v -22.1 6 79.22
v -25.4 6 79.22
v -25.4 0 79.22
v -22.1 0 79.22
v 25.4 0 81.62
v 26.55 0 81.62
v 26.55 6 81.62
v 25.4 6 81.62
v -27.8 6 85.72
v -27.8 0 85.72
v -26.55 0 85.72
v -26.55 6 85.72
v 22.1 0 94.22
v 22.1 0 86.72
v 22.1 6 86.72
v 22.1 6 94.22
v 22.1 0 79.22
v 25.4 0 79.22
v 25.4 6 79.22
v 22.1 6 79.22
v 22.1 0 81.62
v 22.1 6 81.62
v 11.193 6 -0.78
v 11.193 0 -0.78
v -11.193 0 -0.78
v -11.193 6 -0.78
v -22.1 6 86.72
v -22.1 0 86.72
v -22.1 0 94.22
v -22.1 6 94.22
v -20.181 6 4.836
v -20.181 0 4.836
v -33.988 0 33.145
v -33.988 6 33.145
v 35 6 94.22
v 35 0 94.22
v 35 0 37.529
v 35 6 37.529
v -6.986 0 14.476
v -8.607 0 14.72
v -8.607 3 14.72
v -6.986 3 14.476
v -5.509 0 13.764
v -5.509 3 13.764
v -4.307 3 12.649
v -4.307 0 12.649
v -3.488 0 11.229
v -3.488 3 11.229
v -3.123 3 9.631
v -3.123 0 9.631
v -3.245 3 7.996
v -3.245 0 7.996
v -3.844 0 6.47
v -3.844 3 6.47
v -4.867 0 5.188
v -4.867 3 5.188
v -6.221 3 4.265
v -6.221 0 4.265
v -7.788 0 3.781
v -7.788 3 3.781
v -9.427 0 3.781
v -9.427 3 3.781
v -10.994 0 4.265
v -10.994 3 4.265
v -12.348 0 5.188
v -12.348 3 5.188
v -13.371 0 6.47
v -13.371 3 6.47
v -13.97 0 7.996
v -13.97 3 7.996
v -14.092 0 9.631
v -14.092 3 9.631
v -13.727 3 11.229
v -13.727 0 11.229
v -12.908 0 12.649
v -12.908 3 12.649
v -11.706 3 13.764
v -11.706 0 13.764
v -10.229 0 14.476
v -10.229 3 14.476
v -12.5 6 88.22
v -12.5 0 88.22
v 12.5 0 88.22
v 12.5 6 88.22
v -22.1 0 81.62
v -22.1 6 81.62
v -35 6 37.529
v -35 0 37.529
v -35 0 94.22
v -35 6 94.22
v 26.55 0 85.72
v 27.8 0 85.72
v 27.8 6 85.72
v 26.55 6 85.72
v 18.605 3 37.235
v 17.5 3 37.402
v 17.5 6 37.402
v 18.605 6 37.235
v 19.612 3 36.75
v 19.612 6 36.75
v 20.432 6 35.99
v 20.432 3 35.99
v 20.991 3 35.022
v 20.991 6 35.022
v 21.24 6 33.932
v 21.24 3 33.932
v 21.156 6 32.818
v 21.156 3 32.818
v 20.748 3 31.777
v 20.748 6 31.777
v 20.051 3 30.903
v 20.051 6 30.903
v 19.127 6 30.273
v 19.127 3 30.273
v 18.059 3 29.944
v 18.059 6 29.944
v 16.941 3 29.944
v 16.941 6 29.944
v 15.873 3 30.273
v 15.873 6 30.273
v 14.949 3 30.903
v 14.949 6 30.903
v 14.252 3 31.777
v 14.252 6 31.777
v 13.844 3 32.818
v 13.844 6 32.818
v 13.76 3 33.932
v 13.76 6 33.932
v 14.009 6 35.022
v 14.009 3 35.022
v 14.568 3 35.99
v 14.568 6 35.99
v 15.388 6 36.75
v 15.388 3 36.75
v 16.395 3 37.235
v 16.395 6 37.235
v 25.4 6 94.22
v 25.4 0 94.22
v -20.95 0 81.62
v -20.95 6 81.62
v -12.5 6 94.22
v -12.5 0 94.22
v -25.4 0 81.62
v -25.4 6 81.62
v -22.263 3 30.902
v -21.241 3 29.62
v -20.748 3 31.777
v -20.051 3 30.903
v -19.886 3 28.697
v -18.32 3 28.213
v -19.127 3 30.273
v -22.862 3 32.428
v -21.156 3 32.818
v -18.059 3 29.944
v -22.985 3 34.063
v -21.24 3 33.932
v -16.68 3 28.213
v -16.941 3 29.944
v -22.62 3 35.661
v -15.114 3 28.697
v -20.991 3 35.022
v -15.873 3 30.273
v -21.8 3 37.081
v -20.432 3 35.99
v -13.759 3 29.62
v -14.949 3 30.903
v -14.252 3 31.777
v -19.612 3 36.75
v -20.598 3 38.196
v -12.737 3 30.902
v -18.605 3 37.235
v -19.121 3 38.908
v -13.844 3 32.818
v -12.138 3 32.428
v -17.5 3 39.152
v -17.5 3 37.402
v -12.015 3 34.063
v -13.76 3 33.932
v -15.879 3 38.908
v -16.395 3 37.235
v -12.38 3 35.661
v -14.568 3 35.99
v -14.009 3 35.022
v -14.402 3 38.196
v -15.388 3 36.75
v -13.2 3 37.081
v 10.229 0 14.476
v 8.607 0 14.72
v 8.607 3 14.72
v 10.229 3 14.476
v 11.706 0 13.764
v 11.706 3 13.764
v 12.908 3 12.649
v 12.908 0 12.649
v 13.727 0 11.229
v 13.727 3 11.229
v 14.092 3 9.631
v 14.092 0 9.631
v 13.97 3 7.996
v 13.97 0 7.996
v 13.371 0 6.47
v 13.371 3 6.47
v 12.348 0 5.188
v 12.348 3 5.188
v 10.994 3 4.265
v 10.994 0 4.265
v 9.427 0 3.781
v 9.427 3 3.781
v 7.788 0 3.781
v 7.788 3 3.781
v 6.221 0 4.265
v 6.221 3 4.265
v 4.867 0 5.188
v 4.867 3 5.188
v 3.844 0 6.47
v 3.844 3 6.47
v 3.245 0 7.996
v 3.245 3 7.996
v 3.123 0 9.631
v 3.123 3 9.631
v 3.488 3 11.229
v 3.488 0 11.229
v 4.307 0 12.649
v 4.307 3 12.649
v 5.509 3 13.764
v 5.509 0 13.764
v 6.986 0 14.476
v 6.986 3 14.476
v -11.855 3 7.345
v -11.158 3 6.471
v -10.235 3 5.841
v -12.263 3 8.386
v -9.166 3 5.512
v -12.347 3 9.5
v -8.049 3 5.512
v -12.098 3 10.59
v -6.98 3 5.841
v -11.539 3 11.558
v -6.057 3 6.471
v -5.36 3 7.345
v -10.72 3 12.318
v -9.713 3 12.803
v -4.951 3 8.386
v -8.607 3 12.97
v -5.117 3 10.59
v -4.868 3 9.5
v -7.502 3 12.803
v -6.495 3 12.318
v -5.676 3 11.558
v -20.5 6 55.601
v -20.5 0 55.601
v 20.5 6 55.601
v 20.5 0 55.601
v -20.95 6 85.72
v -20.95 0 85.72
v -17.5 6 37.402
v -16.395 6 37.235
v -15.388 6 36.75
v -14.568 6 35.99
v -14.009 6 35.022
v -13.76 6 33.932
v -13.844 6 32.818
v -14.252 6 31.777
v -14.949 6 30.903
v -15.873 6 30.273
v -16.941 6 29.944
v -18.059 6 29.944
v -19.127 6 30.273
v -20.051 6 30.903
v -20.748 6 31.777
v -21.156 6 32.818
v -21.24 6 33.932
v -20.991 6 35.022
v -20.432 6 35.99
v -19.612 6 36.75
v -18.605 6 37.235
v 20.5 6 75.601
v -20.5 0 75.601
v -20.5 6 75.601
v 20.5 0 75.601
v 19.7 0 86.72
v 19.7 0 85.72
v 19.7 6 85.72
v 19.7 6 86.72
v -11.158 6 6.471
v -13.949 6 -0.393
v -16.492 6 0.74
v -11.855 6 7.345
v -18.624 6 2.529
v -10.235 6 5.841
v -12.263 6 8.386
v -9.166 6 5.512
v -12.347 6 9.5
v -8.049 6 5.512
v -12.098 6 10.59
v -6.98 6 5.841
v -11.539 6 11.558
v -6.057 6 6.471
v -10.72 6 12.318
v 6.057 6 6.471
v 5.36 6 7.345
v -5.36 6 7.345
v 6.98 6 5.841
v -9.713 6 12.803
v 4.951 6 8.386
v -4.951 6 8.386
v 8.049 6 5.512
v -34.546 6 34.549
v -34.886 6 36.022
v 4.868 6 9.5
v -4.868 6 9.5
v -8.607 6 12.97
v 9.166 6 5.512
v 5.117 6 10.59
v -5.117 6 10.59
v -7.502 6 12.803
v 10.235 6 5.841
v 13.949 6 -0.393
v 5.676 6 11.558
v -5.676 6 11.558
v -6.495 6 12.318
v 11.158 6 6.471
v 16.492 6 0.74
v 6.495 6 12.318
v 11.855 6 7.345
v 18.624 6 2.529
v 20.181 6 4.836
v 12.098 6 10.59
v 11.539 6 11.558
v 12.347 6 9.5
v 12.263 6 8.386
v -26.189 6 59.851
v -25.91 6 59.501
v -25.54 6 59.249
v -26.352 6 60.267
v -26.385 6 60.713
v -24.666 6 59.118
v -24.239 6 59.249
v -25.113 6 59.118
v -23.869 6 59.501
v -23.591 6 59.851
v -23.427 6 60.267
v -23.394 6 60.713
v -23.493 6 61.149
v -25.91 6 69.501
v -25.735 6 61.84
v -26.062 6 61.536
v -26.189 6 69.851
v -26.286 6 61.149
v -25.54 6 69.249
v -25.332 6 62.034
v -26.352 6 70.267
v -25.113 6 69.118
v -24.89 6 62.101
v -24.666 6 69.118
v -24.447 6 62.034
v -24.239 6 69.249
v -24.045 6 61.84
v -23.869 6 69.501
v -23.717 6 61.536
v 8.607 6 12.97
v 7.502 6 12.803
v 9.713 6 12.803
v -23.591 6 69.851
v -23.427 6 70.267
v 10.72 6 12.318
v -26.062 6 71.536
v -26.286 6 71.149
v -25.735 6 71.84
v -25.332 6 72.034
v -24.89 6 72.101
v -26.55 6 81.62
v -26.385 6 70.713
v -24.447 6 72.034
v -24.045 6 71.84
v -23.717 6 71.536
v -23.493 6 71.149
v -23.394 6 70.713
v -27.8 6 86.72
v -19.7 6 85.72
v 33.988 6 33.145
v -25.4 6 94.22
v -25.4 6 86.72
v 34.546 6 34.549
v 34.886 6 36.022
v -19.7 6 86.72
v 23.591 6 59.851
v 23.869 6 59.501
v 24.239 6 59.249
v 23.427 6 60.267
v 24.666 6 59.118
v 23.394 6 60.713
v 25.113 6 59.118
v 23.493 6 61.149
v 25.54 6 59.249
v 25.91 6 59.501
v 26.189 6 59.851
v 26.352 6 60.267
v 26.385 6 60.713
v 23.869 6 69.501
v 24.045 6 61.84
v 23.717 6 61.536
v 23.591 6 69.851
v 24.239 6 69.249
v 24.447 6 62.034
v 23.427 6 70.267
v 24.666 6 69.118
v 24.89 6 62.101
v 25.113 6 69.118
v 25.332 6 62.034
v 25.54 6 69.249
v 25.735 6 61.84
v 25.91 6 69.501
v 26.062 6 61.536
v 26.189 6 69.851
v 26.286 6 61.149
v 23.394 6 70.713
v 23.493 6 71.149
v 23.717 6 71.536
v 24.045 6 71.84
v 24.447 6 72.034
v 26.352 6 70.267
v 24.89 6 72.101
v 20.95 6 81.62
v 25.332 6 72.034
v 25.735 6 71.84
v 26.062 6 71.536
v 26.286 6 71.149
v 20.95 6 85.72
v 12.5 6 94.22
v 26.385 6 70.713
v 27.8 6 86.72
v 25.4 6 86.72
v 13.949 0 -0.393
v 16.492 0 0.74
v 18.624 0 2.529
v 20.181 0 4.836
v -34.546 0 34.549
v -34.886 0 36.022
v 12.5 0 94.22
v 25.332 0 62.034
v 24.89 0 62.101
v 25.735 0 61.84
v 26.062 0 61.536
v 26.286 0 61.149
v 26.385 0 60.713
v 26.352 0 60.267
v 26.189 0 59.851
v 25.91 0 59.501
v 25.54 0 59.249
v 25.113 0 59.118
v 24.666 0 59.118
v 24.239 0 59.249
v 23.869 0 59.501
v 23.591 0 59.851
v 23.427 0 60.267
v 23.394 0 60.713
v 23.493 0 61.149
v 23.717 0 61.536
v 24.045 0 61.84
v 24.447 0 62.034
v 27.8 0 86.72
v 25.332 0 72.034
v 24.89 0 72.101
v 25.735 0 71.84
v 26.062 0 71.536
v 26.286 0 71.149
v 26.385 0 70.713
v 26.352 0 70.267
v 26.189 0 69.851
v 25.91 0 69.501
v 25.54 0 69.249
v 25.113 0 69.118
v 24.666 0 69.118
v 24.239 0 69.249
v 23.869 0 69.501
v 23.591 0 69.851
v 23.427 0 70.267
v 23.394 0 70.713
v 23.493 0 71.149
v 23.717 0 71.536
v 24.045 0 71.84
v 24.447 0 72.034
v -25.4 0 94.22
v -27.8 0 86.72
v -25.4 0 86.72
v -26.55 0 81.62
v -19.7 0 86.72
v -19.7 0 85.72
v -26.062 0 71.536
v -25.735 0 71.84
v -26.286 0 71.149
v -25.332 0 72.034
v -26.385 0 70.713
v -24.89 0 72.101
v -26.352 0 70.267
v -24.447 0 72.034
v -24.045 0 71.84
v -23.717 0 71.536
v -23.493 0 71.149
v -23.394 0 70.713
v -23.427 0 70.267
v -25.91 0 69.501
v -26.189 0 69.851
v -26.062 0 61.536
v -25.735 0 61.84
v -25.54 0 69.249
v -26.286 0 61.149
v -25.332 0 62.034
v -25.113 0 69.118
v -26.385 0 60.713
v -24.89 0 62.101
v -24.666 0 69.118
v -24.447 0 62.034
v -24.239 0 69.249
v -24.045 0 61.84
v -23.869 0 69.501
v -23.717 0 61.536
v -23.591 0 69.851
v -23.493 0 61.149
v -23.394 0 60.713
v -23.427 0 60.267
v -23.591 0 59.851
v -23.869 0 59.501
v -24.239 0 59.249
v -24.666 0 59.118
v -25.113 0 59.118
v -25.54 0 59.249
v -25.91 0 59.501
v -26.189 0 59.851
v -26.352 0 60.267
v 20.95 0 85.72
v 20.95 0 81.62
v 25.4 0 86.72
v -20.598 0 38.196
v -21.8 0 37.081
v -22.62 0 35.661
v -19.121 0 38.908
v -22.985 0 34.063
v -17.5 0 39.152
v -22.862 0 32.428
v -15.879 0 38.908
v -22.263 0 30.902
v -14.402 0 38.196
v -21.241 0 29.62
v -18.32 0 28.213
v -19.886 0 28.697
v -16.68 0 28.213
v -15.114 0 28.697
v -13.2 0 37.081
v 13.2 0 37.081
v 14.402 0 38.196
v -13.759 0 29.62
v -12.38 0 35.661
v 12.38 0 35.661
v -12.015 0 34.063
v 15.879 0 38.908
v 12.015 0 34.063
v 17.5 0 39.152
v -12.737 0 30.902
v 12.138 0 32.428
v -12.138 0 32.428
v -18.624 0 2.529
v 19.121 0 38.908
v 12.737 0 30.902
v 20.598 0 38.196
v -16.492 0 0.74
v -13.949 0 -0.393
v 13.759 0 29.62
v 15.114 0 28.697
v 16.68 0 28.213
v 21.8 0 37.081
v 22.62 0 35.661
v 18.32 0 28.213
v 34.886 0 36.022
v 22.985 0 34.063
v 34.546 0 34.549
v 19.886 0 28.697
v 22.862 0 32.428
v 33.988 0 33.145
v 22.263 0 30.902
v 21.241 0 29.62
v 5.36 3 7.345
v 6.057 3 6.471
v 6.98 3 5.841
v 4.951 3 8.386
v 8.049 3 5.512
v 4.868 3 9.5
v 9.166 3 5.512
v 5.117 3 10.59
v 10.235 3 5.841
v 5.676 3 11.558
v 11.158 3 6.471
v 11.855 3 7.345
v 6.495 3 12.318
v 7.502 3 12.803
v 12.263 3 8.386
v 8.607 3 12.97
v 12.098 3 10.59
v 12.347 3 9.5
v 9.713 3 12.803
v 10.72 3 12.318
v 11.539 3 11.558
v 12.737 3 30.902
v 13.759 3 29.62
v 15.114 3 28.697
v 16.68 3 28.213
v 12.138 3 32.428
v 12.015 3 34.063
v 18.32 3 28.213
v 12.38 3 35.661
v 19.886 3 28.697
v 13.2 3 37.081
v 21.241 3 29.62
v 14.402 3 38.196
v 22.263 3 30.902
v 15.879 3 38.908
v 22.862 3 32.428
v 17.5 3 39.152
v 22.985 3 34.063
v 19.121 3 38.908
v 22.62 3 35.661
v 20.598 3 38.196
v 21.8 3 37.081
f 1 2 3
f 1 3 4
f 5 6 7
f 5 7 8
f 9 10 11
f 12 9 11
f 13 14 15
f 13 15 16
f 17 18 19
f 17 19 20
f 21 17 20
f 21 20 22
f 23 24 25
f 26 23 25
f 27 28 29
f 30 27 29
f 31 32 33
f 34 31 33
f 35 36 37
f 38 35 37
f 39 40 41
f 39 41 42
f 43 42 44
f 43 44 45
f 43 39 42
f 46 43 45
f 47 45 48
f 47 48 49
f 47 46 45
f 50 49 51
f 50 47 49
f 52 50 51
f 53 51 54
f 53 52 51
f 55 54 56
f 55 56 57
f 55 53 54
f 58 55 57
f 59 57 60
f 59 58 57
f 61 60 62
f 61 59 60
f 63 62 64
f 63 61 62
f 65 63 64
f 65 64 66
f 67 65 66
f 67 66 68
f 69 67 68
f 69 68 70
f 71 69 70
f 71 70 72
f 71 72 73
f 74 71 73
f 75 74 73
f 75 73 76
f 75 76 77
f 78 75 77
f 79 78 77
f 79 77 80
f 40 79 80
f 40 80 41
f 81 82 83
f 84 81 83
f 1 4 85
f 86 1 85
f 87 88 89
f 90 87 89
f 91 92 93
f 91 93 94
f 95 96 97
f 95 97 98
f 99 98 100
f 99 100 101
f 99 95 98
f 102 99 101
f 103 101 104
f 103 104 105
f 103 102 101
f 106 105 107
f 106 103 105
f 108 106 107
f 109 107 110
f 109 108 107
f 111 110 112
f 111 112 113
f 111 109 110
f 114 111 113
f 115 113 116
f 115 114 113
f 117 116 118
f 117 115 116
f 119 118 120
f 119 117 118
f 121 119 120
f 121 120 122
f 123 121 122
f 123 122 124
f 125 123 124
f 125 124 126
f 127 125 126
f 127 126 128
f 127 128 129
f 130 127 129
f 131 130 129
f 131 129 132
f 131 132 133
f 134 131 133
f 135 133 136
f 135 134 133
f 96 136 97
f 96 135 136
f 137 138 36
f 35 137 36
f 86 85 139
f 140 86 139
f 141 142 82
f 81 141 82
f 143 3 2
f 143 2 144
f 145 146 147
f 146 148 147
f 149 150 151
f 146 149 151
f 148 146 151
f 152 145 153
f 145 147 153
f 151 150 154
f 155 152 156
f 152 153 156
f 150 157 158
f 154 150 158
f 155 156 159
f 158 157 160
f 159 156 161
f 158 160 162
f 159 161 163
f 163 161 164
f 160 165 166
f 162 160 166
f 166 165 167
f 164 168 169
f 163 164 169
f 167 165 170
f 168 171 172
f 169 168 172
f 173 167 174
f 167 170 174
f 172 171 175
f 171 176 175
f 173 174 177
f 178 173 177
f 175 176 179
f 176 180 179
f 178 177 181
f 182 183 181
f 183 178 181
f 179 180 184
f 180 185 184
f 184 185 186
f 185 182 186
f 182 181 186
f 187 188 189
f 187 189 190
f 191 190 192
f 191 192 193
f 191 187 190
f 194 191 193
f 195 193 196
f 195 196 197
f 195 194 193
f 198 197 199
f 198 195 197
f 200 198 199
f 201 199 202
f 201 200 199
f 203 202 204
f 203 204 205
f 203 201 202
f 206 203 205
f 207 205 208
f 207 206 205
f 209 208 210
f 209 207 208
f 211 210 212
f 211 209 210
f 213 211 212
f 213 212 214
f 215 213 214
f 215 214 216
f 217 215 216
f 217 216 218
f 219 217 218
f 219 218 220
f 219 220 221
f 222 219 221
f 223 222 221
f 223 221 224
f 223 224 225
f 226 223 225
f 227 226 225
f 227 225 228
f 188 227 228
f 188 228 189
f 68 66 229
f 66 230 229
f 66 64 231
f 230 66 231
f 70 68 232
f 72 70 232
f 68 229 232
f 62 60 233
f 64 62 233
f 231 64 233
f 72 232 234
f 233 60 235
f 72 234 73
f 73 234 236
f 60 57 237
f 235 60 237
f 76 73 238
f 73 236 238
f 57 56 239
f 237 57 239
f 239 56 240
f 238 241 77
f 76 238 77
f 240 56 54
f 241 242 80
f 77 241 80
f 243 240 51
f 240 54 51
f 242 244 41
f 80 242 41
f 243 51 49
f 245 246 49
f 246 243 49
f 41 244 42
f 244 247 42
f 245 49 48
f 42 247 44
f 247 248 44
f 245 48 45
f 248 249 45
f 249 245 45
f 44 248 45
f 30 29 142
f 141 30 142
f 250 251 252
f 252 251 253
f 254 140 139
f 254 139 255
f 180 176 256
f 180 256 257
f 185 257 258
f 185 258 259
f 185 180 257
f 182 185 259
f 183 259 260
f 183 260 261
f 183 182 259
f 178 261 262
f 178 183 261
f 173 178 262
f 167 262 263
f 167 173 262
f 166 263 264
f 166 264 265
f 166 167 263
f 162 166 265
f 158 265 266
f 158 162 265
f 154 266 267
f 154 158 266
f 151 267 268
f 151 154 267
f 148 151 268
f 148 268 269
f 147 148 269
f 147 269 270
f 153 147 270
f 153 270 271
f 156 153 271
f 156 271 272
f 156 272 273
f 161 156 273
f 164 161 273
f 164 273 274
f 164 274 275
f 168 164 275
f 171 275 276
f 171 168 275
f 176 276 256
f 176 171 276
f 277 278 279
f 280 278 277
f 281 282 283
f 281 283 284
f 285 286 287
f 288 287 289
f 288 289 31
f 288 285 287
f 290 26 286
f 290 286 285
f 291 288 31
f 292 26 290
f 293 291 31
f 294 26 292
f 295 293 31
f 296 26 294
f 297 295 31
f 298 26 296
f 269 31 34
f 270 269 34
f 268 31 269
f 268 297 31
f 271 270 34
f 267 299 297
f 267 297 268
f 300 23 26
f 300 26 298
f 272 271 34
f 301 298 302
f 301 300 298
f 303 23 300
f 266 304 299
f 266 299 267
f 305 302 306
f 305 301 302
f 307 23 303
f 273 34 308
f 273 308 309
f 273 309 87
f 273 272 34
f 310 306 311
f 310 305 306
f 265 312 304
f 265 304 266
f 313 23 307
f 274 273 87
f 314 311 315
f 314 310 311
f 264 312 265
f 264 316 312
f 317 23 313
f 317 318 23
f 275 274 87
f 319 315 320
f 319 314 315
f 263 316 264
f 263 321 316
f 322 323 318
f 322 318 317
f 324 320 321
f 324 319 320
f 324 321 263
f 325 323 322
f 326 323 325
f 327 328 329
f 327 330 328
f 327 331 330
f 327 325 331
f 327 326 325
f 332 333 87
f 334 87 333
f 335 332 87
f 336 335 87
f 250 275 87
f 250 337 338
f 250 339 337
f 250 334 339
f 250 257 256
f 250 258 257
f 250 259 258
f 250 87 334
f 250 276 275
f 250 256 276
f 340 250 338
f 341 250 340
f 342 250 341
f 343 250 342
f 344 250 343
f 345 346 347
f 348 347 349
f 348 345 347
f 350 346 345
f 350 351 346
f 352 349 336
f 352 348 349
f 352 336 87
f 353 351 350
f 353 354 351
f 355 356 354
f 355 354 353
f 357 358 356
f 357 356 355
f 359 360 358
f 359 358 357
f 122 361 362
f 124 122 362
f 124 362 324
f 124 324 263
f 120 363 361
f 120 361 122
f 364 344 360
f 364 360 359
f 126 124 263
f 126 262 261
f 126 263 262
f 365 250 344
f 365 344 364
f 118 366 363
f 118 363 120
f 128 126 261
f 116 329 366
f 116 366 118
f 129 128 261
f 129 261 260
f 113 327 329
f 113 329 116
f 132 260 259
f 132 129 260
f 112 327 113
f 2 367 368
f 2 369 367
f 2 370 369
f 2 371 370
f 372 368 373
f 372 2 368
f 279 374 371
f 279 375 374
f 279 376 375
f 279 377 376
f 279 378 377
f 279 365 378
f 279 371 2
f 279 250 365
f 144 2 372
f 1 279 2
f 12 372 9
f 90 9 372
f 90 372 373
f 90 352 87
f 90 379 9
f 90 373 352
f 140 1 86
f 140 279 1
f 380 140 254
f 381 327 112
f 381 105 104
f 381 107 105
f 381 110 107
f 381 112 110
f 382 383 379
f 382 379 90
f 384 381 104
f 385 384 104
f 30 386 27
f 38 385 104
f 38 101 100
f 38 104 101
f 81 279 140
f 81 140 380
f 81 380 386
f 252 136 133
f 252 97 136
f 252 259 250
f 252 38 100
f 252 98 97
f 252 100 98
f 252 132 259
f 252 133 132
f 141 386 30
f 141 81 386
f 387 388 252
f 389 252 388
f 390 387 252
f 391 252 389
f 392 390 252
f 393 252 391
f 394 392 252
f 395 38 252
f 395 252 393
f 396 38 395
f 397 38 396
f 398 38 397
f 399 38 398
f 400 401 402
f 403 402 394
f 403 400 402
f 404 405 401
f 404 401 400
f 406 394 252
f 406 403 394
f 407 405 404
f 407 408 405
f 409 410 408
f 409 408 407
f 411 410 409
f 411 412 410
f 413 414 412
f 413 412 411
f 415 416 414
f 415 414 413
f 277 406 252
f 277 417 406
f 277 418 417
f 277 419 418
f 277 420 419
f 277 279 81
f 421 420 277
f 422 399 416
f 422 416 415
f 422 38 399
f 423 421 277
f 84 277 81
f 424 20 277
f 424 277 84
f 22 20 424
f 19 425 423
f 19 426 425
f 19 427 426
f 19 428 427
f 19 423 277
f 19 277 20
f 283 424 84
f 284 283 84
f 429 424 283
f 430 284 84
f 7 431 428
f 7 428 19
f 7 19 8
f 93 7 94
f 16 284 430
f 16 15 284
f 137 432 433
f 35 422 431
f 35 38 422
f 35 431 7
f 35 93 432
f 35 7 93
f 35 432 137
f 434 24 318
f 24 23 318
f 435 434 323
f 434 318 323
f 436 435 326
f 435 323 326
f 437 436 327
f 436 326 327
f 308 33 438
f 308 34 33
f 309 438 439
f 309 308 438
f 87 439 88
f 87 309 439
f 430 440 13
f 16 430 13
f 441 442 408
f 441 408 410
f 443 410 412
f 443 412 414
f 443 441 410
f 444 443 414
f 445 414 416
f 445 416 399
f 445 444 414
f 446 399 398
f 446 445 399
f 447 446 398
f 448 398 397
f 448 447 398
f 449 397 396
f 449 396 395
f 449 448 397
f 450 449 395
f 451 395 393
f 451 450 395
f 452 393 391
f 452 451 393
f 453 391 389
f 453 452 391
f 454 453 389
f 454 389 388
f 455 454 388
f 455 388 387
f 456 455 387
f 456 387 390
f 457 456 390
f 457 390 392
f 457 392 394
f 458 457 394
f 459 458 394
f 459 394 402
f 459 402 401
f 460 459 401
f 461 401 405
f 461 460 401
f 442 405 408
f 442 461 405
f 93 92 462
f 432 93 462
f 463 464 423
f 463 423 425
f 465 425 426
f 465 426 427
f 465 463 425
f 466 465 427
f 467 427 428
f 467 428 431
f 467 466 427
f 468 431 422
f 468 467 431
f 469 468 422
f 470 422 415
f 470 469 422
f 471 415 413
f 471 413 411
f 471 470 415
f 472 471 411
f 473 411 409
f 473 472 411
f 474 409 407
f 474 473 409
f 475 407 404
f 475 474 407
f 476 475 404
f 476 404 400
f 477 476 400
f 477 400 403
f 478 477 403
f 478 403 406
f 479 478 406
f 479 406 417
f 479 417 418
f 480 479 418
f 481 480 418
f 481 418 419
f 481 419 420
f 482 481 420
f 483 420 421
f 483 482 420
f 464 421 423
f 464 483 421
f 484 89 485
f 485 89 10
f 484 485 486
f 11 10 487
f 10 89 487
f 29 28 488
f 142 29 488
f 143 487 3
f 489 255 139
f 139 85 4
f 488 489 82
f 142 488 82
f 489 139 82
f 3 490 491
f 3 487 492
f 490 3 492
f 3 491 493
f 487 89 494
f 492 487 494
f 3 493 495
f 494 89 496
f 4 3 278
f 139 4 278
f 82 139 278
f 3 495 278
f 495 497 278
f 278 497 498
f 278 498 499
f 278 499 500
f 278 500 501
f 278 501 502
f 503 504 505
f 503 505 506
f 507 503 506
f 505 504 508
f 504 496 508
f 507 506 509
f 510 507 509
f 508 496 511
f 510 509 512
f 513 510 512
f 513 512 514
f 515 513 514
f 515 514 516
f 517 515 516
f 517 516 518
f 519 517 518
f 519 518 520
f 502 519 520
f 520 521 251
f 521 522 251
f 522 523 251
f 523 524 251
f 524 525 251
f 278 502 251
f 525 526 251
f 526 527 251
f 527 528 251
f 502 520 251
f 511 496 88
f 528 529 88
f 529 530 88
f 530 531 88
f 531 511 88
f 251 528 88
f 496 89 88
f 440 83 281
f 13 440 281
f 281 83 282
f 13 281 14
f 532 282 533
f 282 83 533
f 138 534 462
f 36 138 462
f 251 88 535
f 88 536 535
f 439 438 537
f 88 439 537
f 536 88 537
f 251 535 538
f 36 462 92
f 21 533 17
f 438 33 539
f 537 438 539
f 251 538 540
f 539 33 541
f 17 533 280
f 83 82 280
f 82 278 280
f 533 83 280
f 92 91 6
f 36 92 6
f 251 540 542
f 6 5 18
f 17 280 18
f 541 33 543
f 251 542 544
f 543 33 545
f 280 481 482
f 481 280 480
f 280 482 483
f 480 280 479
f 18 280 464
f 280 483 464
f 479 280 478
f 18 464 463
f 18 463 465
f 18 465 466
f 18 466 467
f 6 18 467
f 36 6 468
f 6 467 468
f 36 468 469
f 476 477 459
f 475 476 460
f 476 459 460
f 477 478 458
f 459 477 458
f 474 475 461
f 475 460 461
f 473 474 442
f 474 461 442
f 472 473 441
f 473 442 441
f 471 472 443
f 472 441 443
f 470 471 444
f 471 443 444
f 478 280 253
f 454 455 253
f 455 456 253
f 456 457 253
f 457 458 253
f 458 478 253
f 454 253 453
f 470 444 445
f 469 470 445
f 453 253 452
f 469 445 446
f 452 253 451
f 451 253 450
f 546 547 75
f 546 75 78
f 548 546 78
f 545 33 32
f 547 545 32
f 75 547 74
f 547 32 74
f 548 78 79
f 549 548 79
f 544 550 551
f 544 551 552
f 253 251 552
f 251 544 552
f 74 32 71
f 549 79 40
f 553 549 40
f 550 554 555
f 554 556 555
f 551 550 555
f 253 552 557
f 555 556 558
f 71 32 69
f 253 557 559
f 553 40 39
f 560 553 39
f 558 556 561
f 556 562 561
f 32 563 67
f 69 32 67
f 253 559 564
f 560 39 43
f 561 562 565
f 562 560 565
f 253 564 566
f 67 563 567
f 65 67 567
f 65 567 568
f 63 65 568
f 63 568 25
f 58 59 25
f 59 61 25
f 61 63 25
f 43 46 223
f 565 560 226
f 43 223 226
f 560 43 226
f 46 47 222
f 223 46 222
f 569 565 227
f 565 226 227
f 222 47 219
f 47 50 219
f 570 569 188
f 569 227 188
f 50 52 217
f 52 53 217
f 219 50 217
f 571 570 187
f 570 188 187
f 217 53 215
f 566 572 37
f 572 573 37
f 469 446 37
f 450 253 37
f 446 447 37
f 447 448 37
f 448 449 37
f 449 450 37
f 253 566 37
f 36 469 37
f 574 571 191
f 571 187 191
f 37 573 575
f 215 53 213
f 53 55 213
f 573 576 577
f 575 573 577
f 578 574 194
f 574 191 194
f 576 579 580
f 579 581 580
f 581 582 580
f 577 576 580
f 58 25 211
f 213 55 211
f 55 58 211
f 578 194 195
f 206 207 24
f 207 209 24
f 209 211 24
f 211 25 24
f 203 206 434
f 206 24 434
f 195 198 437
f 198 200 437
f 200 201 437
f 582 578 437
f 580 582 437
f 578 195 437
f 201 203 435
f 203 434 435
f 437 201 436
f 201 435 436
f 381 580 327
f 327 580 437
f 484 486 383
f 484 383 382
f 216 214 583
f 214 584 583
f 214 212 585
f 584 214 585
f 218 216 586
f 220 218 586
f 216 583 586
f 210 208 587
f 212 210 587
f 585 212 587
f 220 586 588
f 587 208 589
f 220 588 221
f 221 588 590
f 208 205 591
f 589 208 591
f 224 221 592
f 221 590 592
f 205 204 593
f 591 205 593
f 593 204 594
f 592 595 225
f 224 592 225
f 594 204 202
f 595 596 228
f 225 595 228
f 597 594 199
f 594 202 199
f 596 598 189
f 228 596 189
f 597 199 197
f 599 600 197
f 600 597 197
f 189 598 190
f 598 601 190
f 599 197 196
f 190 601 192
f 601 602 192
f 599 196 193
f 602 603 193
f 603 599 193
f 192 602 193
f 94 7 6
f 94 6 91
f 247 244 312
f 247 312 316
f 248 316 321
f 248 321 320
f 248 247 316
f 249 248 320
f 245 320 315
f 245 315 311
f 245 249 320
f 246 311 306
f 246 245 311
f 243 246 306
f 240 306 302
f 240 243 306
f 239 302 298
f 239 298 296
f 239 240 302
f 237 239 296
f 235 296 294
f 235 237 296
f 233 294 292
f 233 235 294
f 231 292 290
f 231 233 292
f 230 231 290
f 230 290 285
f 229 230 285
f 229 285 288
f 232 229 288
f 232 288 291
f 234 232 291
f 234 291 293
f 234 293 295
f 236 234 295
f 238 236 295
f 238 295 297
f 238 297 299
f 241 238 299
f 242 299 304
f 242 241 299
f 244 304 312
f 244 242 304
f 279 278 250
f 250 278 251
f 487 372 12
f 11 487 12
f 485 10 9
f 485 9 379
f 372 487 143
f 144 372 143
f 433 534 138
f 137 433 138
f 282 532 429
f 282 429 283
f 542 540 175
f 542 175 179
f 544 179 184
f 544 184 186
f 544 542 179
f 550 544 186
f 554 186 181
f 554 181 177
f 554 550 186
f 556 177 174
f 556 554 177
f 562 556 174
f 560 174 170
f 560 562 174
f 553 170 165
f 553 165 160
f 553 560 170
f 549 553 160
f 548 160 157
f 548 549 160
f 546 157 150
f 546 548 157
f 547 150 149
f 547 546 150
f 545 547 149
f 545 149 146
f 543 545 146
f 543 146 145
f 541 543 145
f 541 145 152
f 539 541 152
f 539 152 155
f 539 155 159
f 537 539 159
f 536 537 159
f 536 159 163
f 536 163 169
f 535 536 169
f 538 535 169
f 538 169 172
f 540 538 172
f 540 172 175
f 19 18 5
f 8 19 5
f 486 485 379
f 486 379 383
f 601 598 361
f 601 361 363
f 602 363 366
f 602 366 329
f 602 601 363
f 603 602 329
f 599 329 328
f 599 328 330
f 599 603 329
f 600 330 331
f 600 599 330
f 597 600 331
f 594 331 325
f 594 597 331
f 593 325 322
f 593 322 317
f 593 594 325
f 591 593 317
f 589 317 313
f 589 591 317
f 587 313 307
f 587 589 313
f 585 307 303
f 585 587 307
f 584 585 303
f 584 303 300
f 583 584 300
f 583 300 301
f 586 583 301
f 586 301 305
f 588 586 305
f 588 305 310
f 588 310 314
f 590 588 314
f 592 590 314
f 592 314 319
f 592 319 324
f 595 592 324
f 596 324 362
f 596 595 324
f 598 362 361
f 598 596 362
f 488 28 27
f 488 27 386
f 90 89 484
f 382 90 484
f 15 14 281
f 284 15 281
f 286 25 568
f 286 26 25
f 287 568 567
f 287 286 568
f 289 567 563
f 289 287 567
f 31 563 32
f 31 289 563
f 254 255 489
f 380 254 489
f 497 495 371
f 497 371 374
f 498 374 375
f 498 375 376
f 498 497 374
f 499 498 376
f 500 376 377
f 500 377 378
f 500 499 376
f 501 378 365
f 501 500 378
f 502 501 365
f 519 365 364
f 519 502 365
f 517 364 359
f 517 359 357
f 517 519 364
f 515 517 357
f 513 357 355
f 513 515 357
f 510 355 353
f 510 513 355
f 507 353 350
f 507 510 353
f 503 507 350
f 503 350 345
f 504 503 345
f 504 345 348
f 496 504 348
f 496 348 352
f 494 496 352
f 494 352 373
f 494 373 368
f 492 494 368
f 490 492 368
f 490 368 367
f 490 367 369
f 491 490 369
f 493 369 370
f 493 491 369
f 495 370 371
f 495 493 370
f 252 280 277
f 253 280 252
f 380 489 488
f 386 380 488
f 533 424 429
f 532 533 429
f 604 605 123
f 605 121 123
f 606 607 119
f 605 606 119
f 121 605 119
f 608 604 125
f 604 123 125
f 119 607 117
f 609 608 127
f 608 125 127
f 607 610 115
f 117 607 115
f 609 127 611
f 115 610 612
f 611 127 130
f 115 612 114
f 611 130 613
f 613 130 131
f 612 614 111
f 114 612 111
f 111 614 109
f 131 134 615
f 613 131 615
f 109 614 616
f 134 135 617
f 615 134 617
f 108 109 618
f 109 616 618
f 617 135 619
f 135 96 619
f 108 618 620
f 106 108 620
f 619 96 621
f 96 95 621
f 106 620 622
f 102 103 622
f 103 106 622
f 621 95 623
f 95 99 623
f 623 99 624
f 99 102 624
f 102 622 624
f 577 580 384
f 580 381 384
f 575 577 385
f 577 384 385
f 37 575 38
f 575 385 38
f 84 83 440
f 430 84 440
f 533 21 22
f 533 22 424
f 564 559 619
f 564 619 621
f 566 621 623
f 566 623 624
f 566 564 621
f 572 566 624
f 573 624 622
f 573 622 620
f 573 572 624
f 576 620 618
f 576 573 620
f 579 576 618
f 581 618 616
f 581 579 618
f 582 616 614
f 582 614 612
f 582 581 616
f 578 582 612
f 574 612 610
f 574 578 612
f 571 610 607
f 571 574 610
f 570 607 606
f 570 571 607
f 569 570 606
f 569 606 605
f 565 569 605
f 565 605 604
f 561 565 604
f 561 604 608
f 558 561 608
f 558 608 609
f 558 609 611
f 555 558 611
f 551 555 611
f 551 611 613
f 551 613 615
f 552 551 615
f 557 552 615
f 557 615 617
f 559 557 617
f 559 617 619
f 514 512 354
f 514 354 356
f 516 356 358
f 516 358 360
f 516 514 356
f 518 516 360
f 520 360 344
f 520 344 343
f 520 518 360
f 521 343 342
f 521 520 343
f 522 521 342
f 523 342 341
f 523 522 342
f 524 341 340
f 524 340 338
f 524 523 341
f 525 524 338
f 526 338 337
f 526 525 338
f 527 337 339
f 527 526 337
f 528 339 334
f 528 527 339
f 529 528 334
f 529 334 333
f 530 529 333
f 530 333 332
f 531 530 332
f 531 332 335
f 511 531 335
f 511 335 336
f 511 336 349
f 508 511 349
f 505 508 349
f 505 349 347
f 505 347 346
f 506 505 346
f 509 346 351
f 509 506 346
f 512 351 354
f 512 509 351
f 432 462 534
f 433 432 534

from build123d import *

# Parameters (mm, degrees)
SKETCH1_R           = 1.5
SKETCH1_R_2         = 5.5
SKETCH1_R_3         = 3.75
BOSS_EXTRUDE1_DEPTH = 6
FILLET1_R           = 10
BOSS_EXTRUDE2_START = 3
SKETCH1_3_R         = 5.5
SKETCH1_3_R_2       = 3.75
BOSS_EXTRUDE2_DEPTH = 3
SKETCH1_4_W         = 41
SKETCH1_4_H         = 20
CUT_EXTRUDE2_DEPTH  = 10
SKETCH4_W           = 3.3
SKETCH4_H           = 15
SKETCH4_W_2         = 5.6
SKETCH4_H_2         = 4.1
SKETCH4_W_3         = 8.1
SKETCH4_H_3         = 1
CUT_EXTRUDE3_DEPTH  = 10


with BuildPart() as part:
    # Sketch1 → Boss-Extrude1 (new body)
    with BuildSketch(Plane(origin=(0, 0, 0), x_dir=(1, 0, 0), z_dir=(0, 1, 0))):
        Polygon((17.441626812, 0.78), (-17.441626812, 0.78), (-35, -35.22), (-35, -94.22), (-12.5, -94.22), (-12.5, -88.22), (12.5, -88.22), (12.5, -94.22), (35, -94.22), (35, -35.22), align=None)
        with Locations(Location((-24.889613301, -70.60075616, 0), (0, 0, 270))):
            Circle(SKETCH1_R, mode=Mode.SUBTRACT)
        with Locations(Location((-24.889613301, -60.60075616, 0), (0, 0, 270))):
            Circle(SKETCH1_R, mode=Mode.SUBTRACT)
        with Locations(Location((24.889613301, -70.60075616, 0), (0, 0, 270))):
            Circle(SKETCH1_R, mode=Mode.SUBTRACT)
        with Locations(Location((24.889613301, -60.60075616, 0), (0, 0, 270))):
            Circle(SKETCH1_R, mode=Mode.SUBTRACT)
        with Locations(Location((-17.5, -33.65200814, 0), (0, 0, 270))):
            Circle(SKETCH1_R_2, mode=Mode.SUBTRACT)
        with Locations(Location((-8.607476274, -9.22, 0), (0, 0, 270))):
            Circle(SKETCH1_R_2, mode=Mode.SUBTRACT)
        with Locations(Location((17.5, -33.65200814, 0), (0, 0, 270))):
            Circle(SKETCH1_R_2, mode=Mode.SUBTRACT)
        with Locations(Location((8.607476274, -9.22, 0), (0, 0, 270))):
            Circle(SKETCH1_R_2, mode=Mode.SUBTRACT)
        with Locations(Location((10.3, -65.60075616, 0), (0, 0, 270))):
            Circle(SKETCH1_R_3, mode=Mode.SUBTRACT)
    extrude(amount=BOSS_EXTRUDE1_DEPTH)

    # Fillet1
    fillet1_edges = [part.edges().sort_by_distance(p)[0] for p in [
        (-35, 3, 35.22),
        (-17.441626812, 3, -0.78),
        (17.441626812, 3, -0.78),
        (35, 3, 35.22),
    ]]
    fillet(fillet1_edges, radius=FILLET1_R)

    # Sketch1<3> → Boss-Extrude2 (add)
    # profile 1 of 4: a face of its own
    with BuildSketch(Plane(origin=(0, 0, 0), x_dir=(1, 0, 0), z_dir=(0, 1, 0)).offset(BOSS_EXTRUDE2_START)):
        with Locations(Location((-17.5, -33.65200814, 0), (0, 0, 270))):
            Circle(SKETCH1_3_R)
        with Locations(Location((-17.5, -33.65200814, 0), (0, 0, 270))):
            Circle(SKETCH1_3_R_2, mode=Mode.SUBTRACT)
    # profile 2 of 4: a face of its own
    with BuildSketch(Plane(origin=(0, 0, 0), x_dir=(1, 0, 0), z_dir=(0, 1, 0)).offset(BOSS_EXTRUDE2_START)):
        with Locations(Location((-8.607476274, -9.22, 0), (0, 0, 270))):
            Circle(SKETCH1_3_R)
        with Locations(Location((-8.607476274, -9.22, 0), (0, 0, 270))):
            Circle(SKETCH1_3_R_2, mode=Mode.SUBTRACT)
    # profile 3 of 4: a face of its own
    with BuildSketch(Plane(origin=(0, 0, 0), x_dir=(1, 0, 0), z_dir=(0, 1, 0)).offset(BOSS_EXTRUDE2_START)):
        with Locations(Location((17.5, -33.65200814, 0), (0, 0, 270))):
            Circle(SKETCH1_3_R)
        with Locations(Location((17.5, -33.65200814, 0), (0, 0, 270))):
            Circle(SKETCH1_3_R_2, mode=Mode.SUBTRACT)
    # profile 4 of 4: a face of its own
    with BuildSketch(Plane(origin=(0, 0, 0), x_dir=(1, 0, 0), z_dir=(0, 1, 0)).offset(BOSS_EXTRUDE2_START)):
        with Locations(Location((8.607476274, -9.22, 0), (0, 0, 270))):
            Circle(SKETCH1_3_R)
        with Locations(Location((8.607476274, -9.22, 0), (0, 0, 270))):
            Circle(SKETCH1_3_R_2, mode=Mode.SUBTRACT)
    extrude(amount=BOSS_EXTRUDE2_DEPTH)

    # Sketch1<4> → Cut-Extrude2 (cut)
    with BuildSketch(Plane(origin=(0, 0, 0), x_dir=(1, 0, 0), z_dir=(0, 1, 0))):
        with Locations((0, -65.60075616)):
            Rectangle(SKETCH1_4_W, SKETCH1_4_H)
    extrude(amount=CUT_EXTRUDE2_DEPTH, mode=Mode.SUBTRACT)

    # Sketch4 → Cut-Extrude3 (cut)
    with BuildSketch(Plane.XZ):
        with Locations((-23.75, 86.72)):
            Rectangle(SKETCH4_W, SKETCH4_H)
        with Locations((-23.75, 83.67)):
            Rectangle(SKETCH4_W_2, SKETCH4_H_2)
        with Locations((-23.75, 86.22)):
            Rectangle(SKETCH4_W_3, SKETCH4_H_3)
    cut_extrude3 = extrude(amount=-CUT_EXTRUDE3_DEPTH, mode=Mode.SUBTRACT)

    # Mirror1: Cut-Extrude3 across plane
    add(cut_extrude3.mirror(Plane(origin=(0, 0, 0), x_dir=(0, 0, 1), z_dir=(1, 0, 0))), mode=Mode.SUBTRACT)


solid = part.part
